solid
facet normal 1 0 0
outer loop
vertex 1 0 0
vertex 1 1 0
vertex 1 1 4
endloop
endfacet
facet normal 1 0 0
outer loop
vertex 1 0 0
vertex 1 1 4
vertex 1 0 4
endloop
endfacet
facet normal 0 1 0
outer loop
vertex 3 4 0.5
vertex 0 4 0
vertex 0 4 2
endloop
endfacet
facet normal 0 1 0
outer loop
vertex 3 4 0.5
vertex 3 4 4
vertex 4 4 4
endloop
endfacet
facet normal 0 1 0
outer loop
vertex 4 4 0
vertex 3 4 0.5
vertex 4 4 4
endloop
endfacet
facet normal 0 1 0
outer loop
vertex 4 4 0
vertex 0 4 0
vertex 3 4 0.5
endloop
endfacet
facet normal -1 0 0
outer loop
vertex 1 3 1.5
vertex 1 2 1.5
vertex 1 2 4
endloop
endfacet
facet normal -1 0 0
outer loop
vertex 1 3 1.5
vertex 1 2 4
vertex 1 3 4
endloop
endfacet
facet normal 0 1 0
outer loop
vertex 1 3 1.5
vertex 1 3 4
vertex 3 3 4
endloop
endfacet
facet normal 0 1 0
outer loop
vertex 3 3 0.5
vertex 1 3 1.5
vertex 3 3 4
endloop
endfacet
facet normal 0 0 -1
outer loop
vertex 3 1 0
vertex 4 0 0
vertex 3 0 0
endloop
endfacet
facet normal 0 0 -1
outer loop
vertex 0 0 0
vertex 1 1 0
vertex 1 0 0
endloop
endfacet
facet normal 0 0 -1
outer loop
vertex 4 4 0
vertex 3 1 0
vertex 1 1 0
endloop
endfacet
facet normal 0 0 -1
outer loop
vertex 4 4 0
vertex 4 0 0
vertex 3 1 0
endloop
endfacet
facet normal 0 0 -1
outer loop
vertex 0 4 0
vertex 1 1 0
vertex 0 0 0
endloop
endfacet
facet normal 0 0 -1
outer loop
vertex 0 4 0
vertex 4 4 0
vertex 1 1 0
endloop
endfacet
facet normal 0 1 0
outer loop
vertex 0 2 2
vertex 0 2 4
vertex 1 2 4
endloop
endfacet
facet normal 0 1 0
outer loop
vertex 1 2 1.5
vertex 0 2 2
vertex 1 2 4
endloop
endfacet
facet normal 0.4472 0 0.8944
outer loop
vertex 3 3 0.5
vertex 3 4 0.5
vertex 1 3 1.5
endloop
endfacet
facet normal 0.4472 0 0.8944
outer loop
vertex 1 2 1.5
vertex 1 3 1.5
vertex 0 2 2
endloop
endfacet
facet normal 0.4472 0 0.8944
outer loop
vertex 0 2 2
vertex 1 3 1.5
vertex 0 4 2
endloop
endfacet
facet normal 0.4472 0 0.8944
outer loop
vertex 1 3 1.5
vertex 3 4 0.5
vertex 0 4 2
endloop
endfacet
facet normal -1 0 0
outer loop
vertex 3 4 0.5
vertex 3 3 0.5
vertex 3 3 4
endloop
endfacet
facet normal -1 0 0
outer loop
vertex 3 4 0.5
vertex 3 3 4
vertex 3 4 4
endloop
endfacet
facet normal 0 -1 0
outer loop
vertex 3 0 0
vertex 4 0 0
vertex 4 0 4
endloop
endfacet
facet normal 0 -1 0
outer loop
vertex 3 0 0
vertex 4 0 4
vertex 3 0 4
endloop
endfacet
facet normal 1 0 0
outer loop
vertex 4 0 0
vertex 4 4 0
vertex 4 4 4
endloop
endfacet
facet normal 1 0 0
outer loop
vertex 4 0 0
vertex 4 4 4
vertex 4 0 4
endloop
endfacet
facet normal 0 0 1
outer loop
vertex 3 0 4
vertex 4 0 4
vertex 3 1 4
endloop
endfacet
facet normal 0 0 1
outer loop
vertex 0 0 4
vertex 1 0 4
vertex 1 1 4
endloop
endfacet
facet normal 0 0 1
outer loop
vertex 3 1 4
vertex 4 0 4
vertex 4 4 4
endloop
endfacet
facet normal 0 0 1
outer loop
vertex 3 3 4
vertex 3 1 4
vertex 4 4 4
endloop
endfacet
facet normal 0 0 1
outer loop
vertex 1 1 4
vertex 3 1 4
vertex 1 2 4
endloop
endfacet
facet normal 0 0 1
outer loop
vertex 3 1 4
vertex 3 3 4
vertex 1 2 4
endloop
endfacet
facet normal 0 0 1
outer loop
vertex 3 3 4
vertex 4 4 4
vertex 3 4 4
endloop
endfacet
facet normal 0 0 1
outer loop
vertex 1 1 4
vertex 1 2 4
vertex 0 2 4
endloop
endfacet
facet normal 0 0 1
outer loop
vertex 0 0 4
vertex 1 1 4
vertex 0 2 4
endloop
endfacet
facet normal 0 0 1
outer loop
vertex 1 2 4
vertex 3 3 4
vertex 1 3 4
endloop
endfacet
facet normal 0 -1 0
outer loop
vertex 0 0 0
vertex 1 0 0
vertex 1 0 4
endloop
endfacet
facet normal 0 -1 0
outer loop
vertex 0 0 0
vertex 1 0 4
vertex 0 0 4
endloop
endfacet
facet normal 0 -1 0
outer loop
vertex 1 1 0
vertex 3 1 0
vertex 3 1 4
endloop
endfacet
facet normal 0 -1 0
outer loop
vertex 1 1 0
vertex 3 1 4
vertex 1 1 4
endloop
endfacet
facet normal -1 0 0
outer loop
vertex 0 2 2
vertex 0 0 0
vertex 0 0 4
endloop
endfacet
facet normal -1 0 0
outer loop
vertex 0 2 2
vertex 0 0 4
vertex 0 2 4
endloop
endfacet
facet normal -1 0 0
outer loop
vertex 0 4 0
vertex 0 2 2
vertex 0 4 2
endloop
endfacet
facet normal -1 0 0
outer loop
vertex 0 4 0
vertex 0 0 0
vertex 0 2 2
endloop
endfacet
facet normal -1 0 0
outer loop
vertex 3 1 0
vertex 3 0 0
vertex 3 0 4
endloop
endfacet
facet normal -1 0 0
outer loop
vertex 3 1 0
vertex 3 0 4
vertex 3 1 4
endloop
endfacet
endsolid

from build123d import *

# Parameters (mm, degrees)
BOSS_EXTRUDE1_DEPTH = 4
BOSS_EXTRUDE4_DEPTH = 2


with BuildPart() as part:
    # Sketch1 → Boss-Extrude1 (new body)
    with BuildSketch(Plane.XY):
        Polygon((0, 0), (0, 2), (1, 2), (1, 3), (3, 3), (3, 4), (4, 4), (4, 0), (3, 0), (3, 1), (1, 1), (1, 0), align=None)
    extrude(amount=BOSS_EXTRUDE1_DEPTH)

    # Sketch6 → Boss-Extrude4 (add)
    with BuildSketch(Plane(origin=(0, 4, 0), x_dir=(1, 0, 0), z_dir=(0, 1, 0))):
        Polygon((4, 0), (0, -2), (0, 0), align=None)
    extrude(amount=-BOSS_EXTRUDE4_DEPTH)


solid = part.part
